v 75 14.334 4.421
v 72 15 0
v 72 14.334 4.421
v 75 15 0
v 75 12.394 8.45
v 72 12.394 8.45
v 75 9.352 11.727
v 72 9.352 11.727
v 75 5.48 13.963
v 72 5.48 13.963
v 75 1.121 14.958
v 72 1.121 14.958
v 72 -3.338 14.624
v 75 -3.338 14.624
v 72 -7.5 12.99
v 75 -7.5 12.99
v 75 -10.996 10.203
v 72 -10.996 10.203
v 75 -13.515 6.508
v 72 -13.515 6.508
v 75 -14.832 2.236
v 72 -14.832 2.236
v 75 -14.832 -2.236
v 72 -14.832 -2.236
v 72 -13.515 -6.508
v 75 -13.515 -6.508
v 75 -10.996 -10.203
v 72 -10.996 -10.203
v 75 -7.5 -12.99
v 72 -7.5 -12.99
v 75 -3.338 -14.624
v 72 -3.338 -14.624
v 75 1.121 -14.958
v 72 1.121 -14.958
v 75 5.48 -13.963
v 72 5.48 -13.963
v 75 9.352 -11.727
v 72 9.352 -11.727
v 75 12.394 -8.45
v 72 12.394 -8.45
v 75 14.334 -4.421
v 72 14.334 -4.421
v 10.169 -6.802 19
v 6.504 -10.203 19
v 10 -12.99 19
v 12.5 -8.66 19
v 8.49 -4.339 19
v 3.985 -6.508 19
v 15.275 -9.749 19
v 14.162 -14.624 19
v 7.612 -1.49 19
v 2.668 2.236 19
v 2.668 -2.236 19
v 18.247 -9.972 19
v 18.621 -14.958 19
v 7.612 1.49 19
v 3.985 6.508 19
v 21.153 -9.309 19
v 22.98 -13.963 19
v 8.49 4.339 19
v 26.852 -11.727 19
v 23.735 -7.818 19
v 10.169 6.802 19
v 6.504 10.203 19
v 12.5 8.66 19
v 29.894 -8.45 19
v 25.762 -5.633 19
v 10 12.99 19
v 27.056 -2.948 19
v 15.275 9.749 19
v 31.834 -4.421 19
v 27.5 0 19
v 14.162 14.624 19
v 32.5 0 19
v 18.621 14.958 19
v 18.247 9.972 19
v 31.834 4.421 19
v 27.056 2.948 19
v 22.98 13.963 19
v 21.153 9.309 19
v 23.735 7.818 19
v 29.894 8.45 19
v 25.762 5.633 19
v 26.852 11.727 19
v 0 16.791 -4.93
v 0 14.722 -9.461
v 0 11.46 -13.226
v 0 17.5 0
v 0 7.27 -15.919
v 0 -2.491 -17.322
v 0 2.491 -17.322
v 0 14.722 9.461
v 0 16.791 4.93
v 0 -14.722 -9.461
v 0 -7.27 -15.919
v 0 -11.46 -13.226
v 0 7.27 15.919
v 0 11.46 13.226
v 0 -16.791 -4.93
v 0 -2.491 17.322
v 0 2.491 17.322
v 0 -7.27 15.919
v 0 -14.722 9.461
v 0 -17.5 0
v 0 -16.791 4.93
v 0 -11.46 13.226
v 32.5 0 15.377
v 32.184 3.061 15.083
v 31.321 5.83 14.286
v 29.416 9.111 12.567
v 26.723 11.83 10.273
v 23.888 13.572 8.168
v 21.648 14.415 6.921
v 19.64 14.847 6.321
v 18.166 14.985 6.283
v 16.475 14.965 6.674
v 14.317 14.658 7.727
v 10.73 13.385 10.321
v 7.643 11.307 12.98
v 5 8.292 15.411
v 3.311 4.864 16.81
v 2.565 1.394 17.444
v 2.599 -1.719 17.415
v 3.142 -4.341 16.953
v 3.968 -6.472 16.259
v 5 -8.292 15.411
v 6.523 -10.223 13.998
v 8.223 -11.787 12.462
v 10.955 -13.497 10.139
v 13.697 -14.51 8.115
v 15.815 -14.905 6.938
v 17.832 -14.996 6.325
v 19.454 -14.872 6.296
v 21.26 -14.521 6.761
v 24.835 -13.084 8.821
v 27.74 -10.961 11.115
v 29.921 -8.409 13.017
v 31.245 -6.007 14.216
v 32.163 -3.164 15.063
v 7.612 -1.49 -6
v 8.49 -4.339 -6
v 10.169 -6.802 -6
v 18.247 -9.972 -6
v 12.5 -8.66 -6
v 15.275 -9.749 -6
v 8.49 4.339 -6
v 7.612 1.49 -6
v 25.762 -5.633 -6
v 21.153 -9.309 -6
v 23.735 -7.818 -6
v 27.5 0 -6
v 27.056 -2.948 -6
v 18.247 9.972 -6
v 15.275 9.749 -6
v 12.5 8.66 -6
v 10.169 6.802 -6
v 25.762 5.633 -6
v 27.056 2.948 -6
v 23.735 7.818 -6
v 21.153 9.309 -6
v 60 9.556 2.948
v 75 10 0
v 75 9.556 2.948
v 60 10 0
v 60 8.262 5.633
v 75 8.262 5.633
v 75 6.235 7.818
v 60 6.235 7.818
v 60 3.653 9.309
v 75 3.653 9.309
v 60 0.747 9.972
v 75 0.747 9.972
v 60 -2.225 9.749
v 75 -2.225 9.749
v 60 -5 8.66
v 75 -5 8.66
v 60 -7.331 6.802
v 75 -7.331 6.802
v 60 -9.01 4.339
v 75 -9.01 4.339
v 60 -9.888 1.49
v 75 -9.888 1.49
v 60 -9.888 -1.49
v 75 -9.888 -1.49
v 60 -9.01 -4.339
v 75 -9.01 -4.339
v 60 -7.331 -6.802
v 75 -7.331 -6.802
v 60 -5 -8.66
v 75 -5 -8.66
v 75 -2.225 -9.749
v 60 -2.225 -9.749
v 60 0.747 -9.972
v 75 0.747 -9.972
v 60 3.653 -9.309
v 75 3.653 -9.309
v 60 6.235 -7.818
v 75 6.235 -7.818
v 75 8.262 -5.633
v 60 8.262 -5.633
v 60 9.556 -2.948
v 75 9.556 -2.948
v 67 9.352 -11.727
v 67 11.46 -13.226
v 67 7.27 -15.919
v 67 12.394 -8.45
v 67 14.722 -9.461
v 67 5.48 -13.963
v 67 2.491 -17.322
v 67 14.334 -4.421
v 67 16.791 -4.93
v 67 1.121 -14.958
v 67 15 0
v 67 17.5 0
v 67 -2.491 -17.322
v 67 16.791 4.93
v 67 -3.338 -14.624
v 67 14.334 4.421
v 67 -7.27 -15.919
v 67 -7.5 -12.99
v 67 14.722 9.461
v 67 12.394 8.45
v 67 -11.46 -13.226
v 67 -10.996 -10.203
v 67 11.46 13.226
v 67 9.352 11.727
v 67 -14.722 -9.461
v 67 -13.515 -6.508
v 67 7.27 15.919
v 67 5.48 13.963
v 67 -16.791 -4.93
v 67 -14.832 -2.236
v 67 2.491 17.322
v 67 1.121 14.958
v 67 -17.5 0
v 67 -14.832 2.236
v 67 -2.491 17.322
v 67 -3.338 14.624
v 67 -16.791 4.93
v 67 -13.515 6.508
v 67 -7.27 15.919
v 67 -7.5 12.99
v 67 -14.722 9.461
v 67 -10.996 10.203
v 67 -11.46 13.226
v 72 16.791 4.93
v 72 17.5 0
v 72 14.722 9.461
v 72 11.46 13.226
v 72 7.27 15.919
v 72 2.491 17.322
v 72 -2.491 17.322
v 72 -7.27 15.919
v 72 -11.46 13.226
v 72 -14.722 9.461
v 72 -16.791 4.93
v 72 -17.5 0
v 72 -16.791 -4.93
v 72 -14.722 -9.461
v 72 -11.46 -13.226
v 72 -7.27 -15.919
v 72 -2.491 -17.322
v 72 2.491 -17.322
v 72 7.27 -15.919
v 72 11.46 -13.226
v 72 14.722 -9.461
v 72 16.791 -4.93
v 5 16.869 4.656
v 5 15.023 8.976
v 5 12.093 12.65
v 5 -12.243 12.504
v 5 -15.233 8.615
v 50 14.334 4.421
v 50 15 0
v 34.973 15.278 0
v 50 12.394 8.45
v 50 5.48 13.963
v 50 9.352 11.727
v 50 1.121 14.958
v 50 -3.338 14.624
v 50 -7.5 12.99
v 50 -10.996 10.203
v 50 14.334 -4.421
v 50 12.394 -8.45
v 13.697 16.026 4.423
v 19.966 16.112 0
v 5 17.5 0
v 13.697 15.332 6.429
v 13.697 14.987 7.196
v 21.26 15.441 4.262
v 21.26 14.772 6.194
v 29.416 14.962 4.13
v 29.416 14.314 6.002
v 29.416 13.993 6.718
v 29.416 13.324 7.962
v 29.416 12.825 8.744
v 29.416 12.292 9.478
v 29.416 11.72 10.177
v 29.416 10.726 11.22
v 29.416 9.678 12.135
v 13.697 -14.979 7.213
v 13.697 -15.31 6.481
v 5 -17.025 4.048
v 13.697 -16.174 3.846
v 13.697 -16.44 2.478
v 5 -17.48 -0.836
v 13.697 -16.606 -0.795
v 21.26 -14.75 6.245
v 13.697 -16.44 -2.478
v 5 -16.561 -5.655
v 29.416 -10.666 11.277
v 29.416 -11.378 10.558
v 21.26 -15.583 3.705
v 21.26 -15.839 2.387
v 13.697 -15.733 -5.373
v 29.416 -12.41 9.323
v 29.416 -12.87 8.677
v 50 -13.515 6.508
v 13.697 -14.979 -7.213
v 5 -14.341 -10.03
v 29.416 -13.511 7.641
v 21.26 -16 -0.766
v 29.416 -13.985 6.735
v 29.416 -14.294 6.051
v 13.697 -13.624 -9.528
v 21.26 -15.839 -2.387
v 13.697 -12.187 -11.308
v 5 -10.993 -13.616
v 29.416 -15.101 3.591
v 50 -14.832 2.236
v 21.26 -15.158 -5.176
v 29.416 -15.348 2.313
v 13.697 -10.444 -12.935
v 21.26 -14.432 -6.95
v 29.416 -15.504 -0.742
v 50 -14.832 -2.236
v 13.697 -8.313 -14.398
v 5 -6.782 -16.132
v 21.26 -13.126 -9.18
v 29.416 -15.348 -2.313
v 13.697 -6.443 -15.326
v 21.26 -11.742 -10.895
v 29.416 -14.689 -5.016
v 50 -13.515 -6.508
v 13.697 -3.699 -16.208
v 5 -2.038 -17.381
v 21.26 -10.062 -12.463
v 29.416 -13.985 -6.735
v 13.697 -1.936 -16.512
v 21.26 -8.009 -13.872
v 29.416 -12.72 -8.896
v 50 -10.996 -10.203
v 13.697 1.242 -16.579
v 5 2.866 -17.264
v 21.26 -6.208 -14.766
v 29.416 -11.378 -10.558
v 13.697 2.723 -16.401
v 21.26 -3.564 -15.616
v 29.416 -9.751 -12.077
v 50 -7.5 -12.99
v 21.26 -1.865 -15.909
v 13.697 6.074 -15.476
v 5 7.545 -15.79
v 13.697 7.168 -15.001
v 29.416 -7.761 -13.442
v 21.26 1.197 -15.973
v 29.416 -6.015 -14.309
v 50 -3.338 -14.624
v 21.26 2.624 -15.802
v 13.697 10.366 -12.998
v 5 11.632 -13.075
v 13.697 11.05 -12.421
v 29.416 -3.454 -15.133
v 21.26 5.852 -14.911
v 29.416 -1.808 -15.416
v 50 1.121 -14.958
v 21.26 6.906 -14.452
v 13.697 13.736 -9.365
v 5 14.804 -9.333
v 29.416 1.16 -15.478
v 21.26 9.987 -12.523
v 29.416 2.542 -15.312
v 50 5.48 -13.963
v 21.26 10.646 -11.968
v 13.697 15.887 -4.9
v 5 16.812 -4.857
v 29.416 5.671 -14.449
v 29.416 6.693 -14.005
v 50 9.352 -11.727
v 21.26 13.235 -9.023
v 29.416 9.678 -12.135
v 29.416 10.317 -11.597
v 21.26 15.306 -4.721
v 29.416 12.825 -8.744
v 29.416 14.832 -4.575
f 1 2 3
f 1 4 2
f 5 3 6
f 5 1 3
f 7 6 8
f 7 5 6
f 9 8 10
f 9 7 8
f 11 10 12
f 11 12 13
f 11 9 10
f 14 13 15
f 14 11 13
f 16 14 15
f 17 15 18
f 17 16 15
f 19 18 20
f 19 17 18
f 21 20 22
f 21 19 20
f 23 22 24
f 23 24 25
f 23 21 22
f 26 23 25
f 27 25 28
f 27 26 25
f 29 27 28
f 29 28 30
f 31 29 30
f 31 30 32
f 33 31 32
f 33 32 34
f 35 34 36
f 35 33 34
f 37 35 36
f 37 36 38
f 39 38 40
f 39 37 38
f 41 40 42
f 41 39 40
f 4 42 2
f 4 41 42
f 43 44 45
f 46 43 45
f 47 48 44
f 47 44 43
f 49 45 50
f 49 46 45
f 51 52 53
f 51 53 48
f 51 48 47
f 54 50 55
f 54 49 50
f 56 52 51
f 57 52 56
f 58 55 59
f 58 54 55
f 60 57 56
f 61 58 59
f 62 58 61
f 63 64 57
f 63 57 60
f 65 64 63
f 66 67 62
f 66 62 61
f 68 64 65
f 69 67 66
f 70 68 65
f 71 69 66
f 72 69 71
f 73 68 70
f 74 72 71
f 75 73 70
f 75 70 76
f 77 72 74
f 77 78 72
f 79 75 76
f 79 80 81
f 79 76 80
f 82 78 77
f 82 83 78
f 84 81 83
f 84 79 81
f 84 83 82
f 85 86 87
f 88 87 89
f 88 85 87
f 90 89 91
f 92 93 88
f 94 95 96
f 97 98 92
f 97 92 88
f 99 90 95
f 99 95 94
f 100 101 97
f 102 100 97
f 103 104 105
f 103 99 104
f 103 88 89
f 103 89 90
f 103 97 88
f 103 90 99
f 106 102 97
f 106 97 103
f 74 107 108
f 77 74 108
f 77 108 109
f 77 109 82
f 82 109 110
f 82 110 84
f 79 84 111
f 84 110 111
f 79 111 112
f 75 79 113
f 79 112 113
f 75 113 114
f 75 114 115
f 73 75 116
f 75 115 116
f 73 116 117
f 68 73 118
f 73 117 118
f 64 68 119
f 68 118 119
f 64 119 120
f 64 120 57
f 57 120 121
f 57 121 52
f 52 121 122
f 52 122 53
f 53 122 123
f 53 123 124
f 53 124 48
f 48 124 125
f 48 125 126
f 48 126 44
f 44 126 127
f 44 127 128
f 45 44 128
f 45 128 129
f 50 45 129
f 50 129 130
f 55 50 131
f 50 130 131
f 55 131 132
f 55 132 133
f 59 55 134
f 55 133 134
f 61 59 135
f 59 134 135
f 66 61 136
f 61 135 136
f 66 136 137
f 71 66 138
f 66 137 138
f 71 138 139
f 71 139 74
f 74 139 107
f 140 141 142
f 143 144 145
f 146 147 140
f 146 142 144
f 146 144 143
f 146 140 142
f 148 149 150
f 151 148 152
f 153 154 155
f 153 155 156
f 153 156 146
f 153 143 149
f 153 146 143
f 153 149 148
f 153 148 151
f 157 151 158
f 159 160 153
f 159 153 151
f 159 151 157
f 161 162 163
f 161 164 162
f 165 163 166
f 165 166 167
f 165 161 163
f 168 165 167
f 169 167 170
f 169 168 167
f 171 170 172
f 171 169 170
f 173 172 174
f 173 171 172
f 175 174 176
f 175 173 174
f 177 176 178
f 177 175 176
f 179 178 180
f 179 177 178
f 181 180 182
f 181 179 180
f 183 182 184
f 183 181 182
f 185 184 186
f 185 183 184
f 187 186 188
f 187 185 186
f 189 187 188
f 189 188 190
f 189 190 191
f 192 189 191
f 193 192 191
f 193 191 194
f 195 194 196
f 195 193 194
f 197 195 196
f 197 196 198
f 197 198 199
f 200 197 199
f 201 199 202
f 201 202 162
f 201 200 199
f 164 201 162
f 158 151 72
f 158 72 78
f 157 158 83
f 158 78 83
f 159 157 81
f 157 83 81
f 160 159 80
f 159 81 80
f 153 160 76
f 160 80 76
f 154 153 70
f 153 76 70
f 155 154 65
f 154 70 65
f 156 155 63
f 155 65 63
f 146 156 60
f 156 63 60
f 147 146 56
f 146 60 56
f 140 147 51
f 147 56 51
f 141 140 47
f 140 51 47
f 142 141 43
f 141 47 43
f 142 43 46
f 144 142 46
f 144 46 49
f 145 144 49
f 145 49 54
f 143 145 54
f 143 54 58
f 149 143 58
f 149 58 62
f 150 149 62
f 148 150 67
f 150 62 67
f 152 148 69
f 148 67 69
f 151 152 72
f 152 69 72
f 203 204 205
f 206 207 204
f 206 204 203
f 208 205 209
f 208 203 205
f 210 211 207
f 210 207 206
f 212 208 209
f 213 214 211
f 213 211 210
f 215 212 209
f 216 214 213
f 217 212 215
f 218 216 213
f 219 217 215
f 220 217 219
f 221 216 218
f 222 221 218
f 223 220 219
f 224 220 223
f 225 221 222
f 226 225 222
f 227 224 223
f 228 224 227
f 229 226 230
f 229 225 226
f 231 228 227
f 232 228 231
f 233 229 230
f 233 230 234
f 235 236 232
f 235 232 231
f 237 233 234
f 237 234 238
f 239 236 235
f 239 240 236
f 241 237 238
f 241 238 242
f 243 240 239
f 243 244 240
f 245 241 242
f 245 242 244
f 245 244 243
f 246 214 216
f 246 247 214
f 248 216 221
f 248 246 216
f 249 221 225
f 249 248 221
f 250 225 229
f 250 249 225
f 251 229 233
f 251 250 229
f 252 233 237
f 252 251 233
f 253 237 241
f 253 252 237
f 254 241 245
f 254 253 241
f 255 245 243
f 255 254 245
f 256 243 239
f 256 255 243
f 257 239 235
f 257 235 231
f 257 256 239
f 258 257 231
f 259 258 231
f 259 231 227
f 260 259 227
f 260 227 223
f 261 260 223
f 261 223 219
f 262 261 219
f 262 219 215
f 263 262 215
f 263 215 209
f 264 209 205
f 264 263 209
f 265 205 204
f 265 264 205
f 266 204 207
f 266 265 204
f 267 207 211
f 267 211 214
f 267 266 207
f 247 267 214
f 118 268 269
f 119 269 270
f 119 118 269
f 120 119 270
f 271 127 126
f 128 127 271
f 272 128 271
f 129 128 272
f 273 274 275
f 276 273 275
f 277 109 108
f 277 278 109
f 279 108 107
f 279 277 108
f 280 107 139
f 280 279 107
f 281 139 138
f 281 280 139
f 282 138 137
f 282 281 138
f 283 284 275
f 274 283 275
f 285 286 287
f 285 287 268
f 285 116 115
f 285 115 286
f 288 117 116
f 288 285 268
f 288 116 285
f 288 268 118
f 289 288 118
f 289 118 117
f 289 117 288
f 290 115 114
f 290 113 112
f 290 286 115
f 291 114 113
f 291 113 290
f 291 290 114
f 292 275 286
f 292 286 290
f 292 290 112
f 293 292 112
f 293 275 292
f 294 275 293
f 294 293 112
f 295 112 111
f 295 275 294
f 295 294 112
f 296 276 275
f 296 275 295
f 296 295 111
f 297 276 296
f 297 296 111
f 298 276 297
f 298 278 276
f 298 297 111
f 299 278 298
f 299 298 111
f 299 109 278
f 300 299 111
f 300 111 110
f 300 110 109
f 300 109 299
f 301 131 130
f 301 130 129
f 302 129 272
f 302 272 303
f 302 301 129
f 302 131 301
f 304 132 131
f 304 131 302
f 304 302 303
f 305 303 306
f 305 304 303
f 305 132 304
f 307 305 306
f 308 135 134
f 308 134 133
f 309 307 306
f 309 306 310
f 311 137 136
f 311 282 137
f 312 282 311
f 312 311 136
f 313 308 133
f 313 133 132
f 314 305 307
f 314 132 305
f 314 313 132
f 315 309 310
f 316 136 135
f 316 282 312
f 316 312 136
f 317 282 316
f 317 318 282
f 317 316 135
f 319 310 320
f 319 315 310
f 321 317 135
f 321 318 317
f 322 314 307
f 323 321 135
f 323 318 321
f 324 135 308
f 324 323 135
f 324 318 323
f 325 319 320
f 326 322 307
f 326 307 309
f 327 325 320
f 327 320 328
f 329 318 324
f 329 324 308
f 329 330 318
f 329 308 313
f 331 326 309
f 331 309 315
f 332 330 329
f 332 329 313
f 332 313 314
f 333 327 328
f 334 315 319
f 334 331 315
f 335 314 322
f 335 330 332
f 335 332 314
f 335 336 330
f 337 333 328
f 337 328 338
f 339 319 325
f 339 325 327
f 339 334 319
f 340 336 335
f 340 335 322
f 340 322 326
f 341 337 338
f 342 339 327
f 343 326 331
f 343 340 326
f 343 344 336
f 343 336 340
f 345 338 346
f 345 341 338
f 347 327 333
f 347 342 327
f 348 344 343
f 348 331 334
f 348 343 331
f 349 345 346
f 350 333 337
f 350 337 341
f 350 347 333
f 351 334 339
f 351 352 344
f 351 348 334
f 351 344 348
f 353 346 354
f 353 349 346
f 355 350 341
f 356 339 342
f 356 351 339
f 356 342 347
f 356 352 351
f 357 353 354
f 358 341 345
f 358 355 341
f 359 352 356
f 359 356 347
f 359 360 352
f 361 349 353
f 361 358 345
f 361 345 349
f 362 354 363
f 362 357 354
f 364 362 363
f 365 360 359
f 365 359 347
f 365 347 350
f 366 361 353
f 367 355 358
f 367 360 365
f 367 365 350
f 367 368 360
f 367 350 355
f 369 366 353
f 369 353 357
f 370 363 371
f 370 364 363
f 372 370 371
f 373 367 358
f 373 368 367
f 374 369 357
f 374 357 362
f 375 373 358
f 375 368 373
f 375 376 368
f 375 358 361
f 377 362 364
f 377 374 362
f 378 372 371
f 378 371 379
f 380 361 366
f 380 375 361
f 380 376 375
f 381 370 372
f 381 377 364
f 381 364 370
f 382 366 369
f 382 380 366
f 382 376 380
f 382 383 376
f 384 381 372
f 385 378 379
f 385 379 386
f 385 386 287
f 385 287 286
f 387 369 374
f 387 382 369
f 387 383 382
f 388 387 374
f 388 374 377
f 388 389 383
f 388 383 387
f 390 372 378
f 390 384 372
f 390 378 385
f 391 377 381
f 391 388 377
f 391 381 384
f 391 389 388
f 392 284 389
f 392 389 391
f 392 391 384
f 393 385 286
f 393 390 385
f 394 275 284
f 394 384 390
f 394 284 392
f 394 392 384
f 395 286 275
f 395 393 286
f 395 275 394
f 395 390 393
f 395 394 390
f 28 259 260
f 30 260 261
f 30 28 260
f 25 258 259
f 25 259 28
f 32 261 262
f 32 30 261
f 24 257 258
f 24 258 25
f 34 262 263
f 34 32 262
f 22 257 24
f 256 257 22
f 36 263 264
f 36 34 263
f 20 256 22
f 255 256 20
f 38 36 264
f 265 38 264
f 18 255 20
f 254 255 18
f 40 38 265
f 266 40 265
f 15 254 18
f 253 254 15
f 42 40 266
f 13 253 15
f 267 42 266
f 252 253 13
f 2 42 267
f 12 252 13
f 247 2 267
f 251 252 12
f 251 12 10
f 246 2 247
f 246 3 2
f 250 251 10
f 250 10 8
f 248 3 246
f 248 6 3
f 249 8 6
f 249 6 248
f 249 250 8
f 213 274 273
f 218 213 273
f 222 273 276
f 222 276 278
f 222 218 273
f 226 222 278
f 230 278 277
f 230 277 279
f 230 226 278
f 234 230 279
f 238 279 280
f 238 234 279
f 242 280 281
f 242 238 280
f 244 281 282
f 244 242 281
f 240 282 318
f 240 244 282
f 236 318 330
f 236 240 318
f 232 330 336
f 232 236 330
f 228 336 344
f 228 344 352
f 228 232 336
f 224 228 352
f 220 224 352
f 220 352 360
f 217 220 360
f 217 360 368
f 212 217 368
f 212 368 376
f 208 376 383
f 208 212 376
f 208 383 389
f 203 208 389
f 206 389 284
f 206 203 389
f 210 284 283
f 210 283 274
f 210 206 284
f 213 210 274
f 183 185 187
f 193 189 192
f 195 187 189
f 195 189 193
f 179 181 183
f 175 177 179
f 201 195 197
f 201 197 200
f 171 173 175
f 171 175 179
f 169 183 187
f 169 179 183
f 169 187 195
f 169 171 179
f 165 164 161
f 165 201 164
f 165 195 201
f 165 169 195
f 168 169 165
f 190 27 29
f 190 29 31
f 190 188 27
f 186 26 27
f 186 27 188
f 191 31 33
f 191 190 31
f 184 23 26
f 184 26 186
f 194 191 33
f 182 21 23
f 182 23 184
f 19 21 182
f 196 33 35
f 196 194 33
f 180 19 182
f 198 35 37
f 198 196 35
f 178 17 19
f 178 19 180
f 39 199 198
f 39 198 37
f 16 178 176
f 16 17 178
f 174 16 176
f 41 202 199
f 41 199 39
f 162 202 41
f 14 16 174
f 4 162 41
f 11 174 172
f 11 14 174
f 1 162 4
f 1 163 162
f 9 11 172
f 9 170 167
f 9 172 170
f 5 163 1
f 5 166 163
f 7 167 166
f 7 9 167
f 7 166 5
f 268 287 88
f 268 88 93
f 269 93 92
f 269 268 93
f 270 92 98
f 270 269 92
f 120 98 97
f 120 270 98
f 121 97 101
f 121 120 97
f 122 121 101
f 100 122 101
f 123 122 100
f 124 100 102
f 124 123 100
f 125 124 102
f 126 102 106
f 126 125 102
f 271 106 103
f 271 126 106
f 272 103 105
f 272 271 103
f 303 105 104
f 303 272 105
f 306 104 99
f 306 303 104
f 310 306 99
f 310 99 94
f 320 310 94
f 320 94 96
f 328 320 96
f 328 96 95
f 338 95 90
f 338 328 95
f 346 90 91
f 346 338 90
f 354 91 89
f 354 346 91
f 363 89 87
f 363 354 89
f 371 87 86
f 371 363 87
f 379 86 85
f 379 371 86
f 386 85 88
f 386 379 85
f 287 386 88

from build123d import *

# Parameters (mm, degrees)
SKETCH_2_R          = 15
EXTRUDE_1_DEPTH     = 19
SKETCH_3_R          = 10
CUT_EXTRUDE_1_DEPTH = 25


with BuildPart() as part:
    # 스케치1 → 회전1 (revolve)
    with BuildSketch(Plane.XY):
        with BuildLine():
            Line((0, 0), (0, 17.5))
            Line((0, 17.5), (5, 17.5))
            ThreePointArc((5, 17.5), (27.465304528, 15.62548151), (50, 15))
            Line((50, 15), (67, 15))
            Line((67, 15), (67, 17.5))
            Line((67, 17.5), (72, 17.5))
            Line((72, 17.5), (72, 15))
            Line((72, 15), (75, 15))
            Line((75, 15), (75, 10))
            Line((75, 10), (60, 10))
            Line((60, 10), (60, 0))
            Line((60, 0), (0, 0))
        make_face()
    revolve(axis=Axis((0, 0, 0), (1, 0, 0)))

    # 스케치2 → 보스-돌출1 (add)
    with BuildSketch(Plane.XY):
        with Locations((17.5, 0)):
            Circle(SKETCH_2_R)
    extrude(amount=EXTRUDE_1_DEPTH)

    # 스케치3 → 컷-돌출1 (cut)
    with BuildSketch(Plane.XY.offset(19)):
        with Locations((17.5, 0)):
            Circle(SKETCH_3_R)
    extrude(amount=-CUT_EXTRUDE_1_DEPTH, mode=Mode.SUBTRACT)


solid = part.part
